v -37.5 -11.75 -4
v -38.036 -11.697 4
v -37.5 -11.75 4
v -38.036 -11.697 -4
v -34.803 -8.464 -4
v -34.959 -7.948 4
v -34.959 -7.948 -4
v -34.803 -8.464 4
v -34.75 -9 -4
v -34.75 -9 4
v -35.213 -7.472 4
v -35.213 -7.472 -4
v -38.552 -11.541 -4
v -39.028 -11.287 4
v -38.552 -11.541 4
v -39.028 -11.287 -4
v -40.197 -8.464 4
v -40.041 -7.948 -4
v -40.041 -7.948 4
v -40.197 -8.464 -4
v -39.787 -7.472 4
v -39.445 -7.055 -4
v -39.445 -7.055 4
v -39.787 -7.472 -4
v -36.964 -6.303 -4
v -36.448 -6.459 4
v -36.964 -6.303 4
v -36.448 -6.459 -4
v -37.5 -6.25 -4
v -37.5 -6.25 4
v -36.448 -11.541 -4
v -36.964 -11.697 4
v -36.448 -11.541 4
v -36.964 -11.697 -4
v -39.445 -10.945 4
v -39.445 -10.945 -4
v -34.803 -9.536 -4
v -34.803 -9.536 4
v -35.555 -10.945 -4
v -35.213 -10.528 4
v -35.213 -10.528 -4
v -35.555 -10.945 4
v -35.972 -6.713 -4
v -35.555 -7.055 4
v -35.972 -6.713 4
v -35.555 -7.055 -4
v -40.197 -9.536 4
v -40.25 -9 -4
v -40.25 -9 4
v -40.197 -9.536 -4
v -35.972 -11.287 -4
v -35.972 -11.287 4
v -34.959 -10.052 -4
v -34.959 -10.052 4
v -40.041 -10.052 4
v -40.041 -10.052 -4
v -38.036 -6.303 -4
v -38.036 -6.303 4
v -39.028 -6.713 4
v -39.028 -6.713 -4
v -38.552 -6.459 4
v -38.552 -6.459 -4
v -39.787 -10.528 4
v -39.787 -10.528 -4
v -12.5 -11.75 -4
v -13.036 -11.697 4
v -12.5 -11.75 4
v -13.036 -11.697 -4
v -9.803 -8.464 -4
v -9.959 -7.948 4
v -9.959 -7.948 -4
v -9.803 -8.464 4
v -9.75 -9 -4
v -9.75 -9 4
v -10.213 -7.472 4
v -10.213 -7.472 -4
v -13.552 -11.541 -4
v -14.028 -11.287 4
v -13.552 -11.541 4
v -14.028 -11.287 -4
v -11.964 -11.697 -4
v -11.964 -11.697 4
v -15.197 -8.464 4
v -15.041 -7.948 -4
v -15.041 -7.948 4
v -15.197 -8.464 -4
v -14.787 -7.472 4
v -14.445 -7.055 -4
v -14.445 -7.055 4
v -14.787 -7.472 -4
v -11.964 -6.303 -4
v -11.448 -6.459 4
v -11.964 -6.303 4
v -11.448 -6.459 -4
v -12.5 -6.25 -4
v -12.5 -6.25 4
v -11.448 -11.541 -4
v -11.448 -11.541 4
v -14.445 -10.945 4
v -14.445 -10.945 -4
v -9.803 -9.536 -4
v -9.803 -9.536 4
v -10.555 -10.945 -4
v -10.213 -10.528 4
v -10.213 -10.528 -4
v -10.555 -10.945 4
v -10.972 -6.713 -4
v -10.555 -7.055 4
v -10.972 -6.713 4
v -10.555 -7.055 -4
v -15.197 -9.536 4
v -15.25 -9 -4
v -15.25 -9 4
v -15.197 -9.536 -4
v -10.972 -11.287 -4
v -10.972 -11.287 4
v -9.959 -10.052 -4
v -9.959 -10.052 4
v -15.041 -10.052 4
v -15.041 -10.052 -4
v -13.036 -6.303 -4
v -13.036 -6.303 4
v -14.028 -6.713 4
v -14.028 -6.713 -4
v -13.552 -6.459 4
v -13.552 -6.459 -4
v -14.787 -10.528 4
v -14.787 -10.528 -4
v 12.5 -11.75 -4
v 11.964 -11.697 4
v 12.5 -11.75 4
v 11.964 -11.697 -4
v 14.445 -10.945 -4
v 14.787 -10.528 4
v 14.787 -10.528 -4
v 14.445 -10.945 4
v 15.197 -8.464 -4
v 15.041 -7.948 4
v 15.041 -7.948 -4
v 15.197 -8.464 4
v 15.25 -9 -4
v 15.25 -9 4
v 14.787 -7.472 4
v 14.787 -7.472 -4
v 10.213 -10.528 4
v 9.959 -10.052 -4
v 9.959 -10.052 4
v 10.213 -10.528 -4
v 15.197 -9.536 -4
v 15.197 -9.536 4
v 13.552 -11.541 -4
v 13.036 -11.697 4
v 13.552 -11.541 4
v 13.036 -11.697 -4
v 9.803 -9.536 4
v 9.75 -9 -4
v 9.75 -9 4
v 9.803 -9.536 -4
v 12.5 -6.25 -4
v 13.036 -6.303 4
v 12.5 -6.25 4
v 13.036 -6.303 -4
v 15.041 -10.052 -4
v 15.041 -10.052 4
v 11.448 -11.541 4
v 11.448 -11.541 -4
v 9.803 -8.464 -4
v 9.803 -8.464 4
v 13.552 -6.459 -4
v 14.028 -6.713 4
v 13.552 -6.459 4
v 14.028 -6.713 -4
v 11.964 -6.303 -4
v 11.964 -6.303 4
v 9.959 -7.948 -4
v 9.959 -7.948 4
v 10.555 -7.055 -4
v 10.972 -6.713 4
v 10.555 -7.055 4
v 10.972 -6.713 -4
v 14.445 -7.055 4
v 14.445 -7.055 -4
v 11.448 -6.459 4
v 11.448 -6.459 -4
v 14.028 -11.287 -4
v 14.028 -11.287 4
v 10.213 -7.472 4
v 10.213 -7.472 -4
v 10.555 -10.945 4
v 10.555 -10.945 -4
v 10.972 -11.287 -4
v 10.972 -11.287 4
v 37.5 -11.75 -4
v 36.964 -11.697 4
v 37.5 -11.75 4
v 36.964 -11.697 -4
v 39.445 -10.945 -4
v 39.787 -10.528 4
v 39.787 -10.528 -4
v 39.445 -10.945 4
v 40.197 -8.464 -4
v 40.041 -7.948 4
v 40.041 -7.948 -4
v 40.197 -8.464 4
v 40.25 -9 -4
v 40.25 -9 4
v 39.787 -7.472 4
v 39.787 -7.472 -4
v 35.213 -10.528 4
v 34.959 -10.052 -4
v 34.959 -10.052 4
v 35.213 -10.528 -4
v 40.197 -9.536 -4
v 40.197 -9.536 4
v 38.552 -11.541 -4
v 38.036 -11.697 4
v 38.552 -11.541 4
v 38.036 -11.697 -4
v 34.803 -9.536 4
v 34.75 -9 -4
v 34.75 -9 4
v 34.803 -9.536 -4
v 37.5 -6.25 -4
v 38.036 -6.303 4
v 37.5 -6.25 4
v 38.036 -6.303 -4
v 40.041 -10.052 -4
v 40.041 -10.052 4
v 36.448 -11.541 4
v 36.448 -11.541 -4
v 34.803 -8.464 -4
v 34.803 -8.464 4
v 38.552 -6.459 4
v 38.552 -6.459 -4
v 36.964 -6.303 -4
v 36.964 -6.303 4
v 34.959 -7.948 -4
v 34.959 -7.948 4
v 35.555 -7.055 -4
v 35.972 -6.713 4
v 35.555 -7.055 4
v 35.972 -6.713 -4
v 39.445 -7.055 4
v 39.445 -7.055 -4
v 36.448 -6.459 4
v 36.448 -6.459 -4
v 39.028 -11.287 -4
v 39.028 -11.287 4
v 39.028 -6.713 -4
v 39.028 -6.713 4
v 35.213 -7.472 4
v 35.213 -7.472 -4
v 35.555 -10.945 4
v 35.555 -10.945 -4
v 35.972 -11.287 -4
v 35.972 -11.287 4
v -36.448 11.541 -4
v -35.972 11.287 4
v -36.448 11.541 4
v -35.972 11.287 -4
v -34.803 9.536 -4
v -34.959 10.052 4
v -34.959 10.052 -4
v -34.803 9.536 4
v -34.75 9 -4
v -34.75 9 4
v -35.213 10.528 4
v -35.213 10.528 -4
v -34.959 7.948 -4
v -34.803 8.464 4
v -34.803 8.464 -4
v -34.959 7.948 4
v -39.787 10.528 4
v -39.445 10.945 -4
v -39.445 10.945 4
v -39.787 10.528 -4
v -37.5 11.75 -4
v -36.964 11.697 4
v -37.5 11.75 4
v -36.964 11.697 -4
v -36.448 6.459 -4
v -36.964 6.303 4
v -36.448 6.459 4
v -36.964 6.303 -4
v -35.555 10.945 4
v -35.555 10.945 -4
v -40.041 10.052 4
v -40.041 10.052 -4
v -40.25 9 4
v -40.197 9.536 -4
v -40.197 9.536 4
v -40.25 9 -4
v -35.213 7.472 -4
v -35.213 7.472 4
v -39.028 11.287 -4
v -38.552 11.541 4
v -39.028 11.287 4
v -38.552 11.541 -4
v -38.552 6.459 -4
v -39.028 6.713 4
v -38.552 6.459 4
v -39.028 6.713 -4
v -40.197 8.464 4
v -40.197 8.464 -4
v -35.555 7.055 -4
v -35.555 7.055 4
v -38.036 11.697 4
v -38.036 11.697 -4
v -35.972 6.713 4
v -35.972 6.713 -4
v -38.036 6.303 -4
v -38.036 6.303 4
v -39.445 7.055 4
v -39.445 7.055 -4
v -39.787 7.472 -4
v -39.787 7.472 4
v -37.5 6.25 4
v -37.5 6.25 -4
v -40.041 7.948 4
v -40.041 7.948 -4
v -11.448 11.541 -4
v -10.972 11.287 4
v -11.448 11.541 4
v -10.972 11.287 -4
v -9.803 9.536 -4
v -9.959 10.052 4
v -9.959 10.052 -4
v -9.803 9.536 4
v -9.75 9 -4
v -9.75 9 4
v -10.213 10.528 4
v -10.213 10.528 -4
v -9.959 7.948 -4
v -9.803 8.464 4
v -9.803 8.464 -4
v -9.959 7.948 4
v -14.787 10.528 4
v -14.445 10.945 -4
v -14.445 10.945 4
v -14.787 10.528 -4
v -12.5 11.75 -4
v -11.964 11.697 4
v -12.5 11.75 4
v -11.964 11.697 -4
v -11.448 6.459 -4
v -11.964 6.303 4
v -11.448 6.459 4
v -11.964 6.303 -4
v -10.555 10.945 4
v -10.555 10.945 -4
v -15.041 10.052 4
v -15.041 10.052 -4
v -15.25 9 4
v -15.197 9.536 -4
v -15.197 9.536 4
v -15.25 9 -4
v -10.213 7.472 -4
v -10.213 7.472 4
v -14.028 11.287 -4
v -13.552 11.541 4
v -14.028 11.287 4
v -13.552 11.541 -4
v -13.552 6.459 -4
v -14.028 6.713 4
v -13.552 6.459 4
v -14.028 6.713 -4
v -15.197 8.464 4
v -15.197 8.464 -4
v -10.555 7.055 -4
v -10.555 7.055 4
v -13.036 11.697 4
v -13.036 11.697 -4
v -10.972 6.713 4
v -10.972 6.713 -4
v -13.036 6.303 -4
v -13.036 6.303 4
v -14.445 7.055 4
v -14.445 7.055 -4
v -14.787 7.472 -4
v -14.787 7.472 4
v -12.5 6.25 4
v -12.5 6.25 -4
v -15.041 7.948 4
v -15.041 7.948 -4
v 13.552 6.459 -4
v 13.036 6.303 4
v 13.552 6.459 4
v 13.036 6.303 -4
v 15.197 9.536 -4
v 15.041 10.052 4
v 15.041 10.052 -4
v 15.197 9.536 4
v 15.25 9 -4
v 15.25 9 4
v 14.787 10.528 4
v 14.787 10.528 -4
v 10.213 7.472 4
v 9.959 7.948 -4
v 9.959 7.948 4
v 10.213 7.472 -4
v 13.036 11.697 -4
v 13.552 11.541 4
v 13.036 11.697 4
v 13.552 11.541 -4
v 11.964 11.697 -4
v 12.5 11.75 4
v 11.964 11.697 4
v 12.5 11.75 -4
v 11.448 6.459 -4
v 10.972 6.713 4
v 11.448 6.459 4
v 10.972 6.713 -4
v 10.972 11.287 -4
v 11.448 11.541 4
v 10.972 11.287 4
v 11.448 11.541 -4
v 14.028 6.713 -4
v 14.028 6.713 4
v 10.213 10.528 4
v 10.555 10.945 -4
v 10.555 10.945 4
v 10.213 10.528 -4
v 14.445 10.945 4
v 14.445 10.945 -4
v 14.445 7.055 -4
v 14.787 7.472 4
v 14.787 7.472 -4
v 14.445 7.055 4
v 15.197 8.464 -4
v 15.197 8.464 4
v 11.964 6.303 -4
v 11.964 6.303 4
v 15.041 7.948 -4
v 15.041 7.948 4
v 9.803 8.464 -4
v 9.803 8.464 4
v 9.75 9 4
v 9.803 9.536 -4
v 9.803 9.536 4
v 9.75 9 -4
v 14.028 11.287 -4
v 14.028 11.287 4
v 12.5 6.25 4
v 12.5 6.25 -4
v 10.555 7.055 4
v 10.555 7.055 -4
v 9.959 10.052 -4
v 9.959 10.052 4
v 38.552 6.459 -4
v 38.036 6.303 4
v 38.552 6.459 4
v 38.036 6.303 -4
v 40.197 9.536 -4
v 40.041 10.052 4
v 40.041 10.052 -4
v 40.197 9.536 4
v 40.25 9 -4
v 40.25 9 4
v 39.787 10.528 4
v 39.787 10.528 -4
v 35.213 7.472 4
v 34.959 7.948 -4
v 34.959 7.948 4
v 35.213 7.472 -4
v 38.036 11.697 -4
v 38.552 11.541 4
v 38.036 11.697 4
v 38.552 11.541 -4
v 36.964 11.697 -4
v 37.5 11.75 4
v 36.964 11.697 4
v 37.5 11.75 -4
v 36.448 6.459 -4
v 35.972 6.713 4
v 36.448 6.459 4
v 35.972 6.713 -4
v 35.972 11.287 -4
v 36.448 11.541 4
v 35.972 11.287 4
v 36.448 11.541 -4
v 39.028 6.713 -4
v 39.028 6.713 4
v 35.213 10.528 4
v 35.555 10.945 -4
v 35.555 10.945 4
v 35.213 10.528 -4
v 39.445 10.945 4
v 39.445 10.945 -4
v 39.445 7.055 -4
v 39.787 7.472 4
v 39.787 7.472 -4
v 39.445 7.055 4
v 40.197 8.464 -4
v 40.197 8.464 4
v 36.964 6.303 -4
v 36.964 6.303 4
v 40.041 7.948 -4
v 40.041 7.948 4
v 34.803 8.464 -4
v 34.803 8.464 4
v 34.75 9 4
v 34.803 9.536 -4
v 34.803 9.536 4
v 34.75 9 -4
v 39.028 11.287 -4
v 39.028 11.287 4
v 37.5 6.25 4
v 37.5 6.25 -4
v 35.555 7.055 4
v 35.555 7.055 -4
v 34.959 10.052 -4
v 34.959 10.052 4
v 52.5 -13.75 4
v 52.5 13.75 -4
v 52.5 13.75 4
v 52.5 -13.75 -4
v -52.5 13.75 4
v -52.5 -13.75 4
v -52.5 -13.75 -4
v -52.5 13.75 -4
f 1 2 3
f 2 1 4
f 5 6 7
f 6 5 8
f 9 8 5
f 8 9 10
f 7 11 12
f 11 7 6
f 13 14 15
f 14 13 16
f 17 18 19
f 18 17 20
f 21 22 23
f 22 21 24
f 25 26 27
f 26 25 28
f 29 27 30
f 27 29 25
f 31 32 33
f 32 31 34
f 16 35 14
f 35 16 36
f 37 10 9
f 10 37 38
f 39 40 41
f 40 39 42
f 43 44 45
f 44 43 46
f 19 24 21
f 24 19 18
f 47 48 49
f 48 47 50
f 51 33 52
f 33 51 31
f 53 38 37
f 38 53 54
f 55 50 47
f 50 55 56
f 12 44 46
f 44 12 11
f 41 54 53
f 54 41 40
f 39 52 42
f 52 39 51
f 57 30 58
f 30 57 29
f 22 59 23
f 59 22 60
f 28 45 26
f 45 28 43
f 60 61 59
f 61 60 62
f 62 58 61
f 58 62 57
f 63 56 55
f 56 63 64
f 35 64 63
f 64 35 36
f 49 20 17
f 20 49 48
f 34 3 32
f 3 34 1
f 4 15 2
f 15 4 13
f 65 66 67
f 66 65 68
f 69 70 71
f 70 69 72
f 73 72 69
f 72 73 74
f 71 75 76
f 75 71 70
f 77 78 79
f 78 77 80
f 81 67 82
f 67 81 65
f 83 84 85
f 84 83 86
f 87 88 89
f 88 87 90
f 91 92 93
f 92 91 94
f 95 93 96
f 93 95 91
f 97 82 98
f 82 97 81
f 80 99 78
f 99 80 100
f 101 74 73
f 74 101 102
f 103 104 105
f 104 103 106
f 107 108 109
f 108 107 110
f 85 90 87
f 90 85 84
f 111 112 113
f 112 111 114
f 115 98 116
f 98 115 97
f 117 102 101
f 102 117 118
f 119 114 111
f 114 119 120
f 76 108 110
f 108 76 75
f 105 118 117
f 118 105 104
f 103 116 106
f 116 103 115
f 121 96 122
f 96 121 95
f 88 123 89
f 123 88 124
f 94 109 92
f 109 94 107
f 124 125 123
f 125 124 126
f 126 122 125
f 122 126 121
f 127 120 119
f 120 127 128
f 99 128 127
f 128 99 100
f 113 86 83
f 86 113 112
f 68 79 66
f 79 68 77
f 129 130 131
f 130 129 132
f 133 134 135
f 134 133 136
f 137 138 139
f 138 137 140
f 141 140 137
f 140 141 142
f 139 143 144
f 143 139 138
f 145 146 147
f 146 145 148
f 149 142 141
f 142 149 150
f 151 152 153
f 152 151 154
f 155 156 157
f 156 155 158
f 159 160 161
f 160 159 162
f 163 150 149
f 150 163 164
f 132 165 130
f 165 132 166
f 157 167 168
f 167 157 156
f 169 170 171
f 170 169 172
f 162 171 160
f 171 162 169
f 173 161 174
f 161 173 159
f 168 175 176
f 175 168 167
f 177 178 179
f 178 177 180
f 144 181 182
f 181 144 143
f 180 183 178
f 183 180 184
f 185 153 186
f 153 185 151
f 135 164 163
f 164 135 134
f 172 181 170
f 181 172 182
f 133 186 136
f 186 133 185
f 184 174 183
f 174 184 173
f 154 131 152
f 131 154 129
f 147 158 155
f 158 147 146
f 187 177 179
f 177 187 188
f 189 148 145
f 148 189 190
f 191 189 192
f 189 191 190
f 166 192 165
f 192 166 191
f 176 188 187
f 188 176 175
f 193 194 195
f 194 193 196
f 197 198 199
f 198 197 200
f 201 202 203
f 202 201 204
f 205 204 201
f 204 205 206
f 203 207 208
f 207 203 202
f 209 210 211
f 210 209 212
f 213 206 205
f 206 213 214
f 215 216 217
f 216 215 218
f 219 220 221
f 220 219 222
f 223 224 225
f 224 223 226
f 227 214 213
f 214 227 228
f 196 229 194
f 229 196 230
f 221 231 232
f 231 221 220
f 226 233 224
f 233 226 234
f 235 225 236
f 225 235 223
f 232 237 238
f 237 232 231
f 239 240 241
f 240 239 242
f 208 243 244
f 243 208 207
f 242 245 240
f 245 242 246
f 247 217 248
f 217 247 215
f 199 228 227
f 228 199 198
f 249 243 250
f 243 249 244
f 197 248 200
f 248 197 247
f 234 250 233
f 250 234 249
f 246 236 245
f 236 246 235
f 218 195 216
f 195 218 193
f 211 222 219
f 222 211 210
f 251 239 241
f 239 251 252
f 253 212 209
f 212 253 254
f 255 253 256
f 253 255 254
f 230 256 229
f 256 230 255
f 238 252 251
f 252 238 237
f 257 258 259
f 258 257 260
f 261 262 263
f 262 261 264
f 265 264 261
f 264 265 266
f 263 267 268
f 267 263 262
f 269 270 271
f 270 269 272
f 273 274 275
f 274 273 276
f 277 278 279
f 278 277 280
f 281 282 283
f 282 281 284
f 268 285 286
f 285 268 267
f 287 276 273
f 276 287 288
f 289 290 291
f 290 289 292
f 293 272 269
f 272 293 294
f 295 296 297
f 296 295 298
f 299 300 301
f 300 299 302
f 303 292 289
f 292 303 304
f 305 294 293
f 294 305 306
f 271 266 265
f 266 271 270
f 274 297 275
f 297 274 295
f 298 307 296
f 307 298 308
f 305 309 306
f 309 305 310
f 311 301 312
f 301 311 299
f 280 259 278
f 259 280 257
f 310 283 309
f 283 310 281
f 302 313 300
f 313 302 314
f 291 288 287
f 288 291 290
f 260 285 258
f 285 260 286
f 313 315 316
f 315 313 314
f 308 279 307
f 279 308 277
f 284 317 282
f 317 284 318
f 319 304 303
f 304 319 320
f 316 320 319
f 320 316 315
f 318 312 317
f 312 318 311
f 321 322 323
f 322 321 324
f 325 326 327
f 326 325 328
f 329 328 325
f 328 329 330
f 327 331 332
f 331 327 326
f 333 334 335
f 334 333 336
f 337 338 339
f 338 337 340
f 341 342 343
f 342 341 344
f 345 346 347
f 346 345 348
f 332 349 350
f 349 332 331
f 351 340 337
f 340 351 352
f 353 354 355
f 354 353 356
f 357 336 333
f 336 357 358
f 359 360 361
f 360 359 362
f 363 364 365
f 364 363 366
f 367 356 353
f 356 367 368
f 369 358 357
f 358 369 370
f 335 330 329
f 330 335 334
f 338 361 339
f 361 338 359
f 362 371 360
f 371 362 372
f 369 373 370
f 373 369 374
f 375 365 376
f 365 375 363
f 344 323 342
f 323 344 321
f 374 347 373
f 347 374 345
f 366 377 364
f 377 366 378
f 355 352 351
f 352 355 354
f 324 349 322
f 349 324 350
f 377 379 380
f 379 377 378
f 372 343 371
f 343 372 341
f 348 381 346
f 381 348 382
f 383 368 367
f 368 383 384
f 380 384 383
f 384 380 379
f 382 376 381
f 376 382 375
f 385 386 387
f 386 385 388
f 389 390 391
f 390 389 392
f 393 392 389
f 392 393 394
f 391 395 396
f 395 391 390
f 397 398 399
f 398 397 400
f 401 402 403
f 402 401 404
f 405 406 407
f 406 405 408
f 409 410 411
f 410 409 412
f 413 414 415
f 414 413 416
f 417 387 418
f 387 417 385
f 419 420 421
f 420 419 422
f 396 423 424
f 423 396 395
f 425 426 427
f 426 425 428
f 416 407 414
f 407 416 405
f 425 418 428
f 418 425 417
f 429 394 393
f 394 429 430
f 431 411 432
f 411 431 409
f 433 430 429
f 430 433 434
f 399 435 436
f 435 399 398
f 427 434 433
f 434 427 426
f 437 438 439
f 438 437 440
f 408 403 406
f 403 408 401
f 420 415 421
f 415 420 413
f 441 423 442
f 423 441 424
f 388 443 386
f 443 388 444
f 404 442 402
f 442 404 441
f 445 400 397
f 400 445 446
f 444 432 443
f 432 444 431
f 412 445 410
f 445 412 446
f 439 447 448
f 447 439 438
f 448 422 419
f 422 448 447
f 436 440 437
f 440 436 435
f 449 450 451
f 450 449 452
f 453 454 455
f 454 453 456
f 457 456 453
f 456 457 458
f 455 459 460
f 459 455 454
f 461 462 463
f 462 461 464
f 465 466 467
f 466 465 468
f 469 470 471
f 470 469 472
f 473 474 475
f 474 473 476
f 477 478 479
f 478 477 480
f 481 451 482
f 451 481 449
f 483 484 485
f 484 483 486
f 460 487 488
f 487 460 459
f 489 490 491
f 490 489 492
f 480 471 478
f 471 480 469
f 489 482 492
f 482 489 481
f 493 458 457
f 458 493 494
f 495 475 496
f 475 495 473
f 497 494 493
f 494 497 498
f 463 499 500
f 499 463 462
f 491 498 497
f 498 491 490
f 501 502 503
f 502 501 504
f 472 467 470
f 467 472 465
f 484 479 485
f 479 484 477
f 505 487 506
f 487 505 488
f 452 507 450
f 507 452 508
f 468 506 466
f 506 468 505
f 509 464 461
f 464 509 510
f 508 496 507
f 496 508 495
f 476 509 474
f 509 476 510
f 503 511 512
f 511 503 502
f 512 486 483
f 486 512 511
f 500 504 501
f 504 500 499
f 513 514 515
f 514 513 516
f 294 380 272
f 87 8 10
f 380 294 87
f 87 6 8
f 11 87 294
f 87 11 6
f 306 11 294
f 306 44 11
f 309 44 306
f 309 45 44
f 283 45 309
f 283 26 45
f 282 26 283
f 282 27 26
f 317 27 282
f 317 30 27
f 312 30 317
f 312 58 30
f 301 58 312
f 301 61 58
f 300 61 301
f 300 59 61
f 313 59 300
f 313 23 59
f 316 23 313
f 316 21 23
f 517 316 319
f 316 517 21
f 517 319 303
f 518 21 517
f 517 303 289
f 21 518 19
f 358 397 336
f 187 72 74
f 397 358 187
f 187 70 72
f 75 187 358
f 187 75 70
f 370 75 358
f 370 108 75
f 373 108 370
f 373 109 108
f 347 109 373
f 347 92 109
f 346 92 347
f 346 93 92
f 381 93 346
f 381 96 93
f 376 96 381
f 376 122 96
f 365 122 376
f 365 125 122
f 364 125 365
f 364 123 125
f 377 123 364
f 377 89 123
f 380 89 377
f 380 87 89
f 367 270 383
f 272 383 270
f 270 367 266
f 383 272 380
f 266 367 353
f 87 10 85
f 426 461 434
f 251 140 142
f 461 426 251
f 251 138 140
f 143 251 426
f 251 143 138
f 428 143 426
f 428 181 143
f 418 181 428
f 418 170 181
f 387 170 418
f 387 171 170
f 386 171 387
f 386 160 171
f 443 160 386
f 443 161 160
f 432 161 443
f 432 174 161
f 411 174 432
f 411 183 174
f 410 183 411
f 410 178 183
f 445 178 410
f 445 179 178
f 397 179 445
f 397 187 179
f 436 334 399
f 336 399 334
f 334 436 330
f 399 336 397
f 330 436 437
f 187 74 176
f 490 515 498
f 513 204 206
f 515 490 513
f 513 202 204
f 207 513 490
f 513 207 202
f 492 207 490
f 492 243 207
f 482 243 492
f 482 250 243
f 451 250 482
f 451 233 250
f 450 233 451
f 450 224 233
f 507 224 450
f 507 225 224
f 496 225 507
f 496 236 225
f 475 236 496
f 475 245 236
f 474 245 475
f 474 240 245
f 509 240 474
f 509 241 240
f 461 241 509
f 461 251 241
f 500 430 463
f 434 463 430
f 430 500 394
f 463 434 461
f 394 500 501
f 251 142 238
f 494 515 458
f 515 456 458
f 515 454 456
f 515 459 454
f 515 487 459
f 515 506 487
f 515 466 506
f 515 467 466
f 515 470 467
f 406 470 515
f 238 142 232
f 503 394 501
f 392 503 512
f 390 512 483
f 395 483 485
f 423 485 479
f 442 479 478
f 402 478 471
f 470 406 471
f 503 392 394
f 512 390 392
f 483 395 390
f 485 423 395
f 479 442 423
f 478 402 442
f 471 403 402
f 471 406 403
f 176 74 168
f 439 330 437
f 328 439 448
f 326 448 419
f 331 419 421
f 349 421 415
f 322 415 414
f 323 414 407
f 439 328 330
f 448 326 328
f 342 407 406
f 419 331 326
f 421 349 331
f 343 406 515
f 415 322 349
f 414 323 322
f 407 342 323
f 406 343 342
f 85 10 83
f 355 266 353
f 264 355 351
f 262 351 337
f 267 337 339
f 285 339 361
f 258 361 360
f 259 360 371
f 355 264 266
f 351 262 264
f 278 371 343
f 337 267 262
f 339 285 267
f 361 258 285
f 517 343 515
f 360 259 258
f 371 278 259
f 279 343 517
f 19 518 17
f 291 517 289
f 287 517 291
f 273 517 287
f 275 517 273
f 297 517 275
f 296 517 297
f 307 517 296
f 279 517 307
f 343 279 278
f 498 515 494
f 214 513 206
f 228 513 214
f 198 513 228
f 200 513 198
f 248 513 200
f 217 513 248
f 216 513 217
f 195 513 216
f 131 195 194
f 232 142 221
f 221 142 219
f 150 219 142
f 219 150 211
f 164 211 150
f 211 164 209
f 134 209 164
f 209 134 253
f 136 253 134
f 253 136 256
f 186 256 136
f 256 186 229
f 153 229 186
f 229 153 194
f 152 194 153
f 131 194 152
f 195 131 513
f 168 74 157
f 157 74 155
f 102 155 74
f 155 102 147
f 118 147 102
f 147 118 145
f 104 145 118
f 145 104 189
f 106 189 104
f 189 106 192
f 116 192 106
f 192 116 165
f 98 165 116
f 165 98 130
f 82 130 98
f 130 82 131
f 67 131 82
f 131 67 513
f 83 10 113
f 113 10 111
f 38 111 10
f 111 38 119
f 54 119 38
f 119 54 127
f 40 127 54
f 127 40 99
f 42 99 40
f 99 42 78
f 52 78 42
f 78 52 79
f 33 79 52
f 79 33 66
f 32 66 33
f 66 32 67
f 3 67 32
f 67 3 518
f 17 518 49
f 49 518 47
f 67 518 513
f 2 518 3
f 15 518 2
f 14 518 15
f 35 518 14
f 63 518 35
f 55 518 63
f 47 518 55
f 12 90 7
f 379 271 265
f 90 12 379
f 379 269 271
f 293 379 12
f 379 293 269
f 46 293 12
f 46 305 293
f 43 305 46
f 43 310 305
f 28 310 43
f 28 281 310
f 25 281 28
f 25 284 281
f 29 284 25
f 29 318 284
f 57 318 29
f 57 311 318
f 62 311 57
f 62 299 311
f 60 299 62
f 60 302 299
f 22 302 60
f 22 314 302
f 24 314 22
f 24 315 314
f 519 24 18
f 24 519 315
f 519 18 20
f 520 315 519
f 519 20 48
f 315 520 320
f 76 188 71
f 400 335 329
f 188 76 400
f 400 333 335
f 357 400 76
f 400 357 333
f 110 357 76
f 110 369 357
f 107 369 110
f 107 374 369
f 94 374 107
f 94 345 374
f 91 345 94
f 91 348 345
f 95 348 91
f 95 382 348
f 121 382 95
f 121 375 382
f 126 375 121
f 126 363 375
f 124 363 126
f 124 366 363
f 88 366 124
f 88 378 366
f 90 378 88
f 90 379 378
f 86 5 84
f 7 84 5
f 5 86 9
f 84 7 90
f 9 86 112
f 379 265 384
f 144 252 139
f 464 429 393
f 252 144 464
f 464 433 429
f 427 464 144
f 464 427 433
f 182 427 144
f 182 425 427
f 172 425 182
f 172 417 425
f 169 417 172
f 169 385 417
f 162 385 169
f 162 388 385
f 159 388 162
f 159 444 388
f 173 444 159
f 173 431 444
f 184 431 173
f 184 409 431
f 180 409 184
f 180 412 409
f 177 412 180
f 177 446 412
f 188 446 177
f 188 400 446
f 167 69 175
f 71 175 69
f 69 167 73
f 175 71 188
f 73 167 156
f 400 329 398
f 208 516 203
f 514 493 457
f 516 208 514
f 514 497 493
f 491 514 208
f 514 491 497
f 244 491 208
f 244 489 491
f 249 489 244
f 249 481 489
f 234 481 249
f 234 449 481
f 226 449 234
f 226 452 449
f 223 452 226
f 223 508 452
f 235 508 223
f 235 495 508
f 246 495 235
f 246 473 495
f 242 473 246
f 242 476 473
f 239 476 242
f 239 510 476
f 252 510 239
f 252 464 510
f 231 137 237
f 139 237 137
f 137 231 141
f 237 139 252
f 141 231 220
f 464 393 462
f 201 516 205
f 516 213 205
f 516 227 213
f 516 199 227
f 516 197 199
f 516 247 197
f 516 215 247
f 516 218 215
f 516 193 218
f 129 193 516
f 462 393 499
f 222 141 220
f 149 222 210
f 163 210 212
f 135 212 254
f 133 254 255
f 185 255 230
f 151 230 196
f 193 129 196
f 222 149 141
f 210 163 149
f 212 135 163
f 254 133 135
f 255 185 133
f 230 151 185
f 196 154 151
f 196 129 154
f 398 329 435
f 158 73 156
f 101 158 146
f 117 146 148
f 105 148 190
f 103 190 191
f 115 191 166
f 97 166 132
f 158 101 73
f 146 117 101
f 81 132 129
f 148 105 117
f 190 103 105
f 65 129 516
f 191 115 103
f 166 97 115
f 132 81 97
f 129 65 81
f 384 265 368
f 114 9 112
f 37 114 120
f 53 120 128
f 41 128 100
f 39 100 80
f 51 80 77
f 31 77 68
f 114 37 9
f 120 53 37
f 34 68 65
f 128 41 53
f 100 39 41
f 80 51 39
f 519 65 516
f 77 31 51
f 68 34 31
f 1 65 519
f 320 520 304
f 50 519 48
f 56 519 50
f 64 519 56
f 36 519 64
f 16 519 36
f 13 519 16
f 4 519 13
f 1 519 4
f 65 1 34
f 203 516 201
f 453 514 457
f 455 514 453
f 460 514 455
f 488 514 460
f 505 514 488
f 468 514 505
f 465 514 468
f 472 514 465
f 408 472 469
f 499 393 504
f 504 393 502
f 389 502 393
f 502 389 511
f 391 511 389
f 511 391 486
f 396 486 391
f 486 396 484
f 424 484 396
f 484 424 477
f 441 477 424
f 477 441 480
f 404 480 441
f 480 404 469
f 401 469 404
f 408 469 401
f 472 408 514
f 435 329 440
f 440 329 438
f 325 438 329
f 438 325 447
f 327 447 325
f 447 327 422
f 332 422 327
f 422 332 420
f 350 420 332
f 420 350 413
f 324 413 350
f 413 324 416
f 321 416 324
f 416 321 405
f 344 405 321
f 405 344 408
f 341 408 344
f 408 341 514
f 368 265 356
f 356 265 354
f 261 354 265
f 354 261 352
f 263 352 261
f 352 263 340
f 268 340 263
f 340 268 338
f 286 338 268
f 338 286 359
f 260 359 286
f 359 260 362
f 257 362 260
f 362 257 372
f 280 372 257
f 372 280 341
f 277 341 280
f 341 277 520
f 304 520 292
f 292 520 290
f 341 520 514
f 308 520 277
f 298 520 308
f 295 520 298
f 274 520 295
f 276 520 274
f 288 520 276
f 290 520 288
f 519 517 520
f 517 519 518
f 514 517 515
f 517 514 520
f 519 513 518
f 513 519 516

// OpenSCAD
$fn = 32;

// ----------------------------------------------------------------------
// Hole bar, 4 x Ø5.5
// tworows layout, 15 mm edge offset
// ----------------------------------------------------------------------

// --- parameters (mm) ---
bar_w = 27.5;     // bar width (Y)
bar_t = 8;        // bar thickness (Z)
holes = 4;        // holes per row
hole_d = 5.5;     // hole diameter
edge = 15;        // offset from the bar end to the first hole
pitch = 25;       // pitch between neighbouring holes
row_offset = 18;  // distance between the two rows

// --- derived feature positions (mm) ---
span = (holes - 1) * pitch;   // = 75   distance between the end holes
bar_l = span + 2 * edge;      // = 105   overall bar length
start_x = -bar_l / 2 + edge;  // = -37.5   X of the first hole
feature_centers = [
  [start_x + 0 * pitch, -row_offset / 2],
  [start_x + 1 * pitch, -row_offset / 2],
  [start_x + 2 * pitch, -row_offset / 2],
  [start_x + 3 * pitch, -row_offset / 2]
];   // hole centres of the first row
row2_centers = [
  [start_x + 0 * pitch, row_offset / 2],
  [start_x + 1 * pitch, row_offset / 2],
  [start_x + 2 * pitch, row_offset / 2],
  [start_x + 3 * pitch, row_offset / 2]
];   // hole centres of the second row

// bar with two rows of holes, both read from their own centre arrays
difference() {
  translate([-bar_l / 2, -bar_w / 2, -bar_t / 2]) cube([bar_l, bar_w, bar_t]);
  for (centre = feature_centers)
    translate([centre[0], centre[1], 0])
      cylinder(d = hole_d, h = bar_t + 2, center = true);
  for (centre = row2_centers)
    translate([centre[0], centre[1], 0])
      cylinder(d = hole_d, h = bar_t + 2, center = true);
}
